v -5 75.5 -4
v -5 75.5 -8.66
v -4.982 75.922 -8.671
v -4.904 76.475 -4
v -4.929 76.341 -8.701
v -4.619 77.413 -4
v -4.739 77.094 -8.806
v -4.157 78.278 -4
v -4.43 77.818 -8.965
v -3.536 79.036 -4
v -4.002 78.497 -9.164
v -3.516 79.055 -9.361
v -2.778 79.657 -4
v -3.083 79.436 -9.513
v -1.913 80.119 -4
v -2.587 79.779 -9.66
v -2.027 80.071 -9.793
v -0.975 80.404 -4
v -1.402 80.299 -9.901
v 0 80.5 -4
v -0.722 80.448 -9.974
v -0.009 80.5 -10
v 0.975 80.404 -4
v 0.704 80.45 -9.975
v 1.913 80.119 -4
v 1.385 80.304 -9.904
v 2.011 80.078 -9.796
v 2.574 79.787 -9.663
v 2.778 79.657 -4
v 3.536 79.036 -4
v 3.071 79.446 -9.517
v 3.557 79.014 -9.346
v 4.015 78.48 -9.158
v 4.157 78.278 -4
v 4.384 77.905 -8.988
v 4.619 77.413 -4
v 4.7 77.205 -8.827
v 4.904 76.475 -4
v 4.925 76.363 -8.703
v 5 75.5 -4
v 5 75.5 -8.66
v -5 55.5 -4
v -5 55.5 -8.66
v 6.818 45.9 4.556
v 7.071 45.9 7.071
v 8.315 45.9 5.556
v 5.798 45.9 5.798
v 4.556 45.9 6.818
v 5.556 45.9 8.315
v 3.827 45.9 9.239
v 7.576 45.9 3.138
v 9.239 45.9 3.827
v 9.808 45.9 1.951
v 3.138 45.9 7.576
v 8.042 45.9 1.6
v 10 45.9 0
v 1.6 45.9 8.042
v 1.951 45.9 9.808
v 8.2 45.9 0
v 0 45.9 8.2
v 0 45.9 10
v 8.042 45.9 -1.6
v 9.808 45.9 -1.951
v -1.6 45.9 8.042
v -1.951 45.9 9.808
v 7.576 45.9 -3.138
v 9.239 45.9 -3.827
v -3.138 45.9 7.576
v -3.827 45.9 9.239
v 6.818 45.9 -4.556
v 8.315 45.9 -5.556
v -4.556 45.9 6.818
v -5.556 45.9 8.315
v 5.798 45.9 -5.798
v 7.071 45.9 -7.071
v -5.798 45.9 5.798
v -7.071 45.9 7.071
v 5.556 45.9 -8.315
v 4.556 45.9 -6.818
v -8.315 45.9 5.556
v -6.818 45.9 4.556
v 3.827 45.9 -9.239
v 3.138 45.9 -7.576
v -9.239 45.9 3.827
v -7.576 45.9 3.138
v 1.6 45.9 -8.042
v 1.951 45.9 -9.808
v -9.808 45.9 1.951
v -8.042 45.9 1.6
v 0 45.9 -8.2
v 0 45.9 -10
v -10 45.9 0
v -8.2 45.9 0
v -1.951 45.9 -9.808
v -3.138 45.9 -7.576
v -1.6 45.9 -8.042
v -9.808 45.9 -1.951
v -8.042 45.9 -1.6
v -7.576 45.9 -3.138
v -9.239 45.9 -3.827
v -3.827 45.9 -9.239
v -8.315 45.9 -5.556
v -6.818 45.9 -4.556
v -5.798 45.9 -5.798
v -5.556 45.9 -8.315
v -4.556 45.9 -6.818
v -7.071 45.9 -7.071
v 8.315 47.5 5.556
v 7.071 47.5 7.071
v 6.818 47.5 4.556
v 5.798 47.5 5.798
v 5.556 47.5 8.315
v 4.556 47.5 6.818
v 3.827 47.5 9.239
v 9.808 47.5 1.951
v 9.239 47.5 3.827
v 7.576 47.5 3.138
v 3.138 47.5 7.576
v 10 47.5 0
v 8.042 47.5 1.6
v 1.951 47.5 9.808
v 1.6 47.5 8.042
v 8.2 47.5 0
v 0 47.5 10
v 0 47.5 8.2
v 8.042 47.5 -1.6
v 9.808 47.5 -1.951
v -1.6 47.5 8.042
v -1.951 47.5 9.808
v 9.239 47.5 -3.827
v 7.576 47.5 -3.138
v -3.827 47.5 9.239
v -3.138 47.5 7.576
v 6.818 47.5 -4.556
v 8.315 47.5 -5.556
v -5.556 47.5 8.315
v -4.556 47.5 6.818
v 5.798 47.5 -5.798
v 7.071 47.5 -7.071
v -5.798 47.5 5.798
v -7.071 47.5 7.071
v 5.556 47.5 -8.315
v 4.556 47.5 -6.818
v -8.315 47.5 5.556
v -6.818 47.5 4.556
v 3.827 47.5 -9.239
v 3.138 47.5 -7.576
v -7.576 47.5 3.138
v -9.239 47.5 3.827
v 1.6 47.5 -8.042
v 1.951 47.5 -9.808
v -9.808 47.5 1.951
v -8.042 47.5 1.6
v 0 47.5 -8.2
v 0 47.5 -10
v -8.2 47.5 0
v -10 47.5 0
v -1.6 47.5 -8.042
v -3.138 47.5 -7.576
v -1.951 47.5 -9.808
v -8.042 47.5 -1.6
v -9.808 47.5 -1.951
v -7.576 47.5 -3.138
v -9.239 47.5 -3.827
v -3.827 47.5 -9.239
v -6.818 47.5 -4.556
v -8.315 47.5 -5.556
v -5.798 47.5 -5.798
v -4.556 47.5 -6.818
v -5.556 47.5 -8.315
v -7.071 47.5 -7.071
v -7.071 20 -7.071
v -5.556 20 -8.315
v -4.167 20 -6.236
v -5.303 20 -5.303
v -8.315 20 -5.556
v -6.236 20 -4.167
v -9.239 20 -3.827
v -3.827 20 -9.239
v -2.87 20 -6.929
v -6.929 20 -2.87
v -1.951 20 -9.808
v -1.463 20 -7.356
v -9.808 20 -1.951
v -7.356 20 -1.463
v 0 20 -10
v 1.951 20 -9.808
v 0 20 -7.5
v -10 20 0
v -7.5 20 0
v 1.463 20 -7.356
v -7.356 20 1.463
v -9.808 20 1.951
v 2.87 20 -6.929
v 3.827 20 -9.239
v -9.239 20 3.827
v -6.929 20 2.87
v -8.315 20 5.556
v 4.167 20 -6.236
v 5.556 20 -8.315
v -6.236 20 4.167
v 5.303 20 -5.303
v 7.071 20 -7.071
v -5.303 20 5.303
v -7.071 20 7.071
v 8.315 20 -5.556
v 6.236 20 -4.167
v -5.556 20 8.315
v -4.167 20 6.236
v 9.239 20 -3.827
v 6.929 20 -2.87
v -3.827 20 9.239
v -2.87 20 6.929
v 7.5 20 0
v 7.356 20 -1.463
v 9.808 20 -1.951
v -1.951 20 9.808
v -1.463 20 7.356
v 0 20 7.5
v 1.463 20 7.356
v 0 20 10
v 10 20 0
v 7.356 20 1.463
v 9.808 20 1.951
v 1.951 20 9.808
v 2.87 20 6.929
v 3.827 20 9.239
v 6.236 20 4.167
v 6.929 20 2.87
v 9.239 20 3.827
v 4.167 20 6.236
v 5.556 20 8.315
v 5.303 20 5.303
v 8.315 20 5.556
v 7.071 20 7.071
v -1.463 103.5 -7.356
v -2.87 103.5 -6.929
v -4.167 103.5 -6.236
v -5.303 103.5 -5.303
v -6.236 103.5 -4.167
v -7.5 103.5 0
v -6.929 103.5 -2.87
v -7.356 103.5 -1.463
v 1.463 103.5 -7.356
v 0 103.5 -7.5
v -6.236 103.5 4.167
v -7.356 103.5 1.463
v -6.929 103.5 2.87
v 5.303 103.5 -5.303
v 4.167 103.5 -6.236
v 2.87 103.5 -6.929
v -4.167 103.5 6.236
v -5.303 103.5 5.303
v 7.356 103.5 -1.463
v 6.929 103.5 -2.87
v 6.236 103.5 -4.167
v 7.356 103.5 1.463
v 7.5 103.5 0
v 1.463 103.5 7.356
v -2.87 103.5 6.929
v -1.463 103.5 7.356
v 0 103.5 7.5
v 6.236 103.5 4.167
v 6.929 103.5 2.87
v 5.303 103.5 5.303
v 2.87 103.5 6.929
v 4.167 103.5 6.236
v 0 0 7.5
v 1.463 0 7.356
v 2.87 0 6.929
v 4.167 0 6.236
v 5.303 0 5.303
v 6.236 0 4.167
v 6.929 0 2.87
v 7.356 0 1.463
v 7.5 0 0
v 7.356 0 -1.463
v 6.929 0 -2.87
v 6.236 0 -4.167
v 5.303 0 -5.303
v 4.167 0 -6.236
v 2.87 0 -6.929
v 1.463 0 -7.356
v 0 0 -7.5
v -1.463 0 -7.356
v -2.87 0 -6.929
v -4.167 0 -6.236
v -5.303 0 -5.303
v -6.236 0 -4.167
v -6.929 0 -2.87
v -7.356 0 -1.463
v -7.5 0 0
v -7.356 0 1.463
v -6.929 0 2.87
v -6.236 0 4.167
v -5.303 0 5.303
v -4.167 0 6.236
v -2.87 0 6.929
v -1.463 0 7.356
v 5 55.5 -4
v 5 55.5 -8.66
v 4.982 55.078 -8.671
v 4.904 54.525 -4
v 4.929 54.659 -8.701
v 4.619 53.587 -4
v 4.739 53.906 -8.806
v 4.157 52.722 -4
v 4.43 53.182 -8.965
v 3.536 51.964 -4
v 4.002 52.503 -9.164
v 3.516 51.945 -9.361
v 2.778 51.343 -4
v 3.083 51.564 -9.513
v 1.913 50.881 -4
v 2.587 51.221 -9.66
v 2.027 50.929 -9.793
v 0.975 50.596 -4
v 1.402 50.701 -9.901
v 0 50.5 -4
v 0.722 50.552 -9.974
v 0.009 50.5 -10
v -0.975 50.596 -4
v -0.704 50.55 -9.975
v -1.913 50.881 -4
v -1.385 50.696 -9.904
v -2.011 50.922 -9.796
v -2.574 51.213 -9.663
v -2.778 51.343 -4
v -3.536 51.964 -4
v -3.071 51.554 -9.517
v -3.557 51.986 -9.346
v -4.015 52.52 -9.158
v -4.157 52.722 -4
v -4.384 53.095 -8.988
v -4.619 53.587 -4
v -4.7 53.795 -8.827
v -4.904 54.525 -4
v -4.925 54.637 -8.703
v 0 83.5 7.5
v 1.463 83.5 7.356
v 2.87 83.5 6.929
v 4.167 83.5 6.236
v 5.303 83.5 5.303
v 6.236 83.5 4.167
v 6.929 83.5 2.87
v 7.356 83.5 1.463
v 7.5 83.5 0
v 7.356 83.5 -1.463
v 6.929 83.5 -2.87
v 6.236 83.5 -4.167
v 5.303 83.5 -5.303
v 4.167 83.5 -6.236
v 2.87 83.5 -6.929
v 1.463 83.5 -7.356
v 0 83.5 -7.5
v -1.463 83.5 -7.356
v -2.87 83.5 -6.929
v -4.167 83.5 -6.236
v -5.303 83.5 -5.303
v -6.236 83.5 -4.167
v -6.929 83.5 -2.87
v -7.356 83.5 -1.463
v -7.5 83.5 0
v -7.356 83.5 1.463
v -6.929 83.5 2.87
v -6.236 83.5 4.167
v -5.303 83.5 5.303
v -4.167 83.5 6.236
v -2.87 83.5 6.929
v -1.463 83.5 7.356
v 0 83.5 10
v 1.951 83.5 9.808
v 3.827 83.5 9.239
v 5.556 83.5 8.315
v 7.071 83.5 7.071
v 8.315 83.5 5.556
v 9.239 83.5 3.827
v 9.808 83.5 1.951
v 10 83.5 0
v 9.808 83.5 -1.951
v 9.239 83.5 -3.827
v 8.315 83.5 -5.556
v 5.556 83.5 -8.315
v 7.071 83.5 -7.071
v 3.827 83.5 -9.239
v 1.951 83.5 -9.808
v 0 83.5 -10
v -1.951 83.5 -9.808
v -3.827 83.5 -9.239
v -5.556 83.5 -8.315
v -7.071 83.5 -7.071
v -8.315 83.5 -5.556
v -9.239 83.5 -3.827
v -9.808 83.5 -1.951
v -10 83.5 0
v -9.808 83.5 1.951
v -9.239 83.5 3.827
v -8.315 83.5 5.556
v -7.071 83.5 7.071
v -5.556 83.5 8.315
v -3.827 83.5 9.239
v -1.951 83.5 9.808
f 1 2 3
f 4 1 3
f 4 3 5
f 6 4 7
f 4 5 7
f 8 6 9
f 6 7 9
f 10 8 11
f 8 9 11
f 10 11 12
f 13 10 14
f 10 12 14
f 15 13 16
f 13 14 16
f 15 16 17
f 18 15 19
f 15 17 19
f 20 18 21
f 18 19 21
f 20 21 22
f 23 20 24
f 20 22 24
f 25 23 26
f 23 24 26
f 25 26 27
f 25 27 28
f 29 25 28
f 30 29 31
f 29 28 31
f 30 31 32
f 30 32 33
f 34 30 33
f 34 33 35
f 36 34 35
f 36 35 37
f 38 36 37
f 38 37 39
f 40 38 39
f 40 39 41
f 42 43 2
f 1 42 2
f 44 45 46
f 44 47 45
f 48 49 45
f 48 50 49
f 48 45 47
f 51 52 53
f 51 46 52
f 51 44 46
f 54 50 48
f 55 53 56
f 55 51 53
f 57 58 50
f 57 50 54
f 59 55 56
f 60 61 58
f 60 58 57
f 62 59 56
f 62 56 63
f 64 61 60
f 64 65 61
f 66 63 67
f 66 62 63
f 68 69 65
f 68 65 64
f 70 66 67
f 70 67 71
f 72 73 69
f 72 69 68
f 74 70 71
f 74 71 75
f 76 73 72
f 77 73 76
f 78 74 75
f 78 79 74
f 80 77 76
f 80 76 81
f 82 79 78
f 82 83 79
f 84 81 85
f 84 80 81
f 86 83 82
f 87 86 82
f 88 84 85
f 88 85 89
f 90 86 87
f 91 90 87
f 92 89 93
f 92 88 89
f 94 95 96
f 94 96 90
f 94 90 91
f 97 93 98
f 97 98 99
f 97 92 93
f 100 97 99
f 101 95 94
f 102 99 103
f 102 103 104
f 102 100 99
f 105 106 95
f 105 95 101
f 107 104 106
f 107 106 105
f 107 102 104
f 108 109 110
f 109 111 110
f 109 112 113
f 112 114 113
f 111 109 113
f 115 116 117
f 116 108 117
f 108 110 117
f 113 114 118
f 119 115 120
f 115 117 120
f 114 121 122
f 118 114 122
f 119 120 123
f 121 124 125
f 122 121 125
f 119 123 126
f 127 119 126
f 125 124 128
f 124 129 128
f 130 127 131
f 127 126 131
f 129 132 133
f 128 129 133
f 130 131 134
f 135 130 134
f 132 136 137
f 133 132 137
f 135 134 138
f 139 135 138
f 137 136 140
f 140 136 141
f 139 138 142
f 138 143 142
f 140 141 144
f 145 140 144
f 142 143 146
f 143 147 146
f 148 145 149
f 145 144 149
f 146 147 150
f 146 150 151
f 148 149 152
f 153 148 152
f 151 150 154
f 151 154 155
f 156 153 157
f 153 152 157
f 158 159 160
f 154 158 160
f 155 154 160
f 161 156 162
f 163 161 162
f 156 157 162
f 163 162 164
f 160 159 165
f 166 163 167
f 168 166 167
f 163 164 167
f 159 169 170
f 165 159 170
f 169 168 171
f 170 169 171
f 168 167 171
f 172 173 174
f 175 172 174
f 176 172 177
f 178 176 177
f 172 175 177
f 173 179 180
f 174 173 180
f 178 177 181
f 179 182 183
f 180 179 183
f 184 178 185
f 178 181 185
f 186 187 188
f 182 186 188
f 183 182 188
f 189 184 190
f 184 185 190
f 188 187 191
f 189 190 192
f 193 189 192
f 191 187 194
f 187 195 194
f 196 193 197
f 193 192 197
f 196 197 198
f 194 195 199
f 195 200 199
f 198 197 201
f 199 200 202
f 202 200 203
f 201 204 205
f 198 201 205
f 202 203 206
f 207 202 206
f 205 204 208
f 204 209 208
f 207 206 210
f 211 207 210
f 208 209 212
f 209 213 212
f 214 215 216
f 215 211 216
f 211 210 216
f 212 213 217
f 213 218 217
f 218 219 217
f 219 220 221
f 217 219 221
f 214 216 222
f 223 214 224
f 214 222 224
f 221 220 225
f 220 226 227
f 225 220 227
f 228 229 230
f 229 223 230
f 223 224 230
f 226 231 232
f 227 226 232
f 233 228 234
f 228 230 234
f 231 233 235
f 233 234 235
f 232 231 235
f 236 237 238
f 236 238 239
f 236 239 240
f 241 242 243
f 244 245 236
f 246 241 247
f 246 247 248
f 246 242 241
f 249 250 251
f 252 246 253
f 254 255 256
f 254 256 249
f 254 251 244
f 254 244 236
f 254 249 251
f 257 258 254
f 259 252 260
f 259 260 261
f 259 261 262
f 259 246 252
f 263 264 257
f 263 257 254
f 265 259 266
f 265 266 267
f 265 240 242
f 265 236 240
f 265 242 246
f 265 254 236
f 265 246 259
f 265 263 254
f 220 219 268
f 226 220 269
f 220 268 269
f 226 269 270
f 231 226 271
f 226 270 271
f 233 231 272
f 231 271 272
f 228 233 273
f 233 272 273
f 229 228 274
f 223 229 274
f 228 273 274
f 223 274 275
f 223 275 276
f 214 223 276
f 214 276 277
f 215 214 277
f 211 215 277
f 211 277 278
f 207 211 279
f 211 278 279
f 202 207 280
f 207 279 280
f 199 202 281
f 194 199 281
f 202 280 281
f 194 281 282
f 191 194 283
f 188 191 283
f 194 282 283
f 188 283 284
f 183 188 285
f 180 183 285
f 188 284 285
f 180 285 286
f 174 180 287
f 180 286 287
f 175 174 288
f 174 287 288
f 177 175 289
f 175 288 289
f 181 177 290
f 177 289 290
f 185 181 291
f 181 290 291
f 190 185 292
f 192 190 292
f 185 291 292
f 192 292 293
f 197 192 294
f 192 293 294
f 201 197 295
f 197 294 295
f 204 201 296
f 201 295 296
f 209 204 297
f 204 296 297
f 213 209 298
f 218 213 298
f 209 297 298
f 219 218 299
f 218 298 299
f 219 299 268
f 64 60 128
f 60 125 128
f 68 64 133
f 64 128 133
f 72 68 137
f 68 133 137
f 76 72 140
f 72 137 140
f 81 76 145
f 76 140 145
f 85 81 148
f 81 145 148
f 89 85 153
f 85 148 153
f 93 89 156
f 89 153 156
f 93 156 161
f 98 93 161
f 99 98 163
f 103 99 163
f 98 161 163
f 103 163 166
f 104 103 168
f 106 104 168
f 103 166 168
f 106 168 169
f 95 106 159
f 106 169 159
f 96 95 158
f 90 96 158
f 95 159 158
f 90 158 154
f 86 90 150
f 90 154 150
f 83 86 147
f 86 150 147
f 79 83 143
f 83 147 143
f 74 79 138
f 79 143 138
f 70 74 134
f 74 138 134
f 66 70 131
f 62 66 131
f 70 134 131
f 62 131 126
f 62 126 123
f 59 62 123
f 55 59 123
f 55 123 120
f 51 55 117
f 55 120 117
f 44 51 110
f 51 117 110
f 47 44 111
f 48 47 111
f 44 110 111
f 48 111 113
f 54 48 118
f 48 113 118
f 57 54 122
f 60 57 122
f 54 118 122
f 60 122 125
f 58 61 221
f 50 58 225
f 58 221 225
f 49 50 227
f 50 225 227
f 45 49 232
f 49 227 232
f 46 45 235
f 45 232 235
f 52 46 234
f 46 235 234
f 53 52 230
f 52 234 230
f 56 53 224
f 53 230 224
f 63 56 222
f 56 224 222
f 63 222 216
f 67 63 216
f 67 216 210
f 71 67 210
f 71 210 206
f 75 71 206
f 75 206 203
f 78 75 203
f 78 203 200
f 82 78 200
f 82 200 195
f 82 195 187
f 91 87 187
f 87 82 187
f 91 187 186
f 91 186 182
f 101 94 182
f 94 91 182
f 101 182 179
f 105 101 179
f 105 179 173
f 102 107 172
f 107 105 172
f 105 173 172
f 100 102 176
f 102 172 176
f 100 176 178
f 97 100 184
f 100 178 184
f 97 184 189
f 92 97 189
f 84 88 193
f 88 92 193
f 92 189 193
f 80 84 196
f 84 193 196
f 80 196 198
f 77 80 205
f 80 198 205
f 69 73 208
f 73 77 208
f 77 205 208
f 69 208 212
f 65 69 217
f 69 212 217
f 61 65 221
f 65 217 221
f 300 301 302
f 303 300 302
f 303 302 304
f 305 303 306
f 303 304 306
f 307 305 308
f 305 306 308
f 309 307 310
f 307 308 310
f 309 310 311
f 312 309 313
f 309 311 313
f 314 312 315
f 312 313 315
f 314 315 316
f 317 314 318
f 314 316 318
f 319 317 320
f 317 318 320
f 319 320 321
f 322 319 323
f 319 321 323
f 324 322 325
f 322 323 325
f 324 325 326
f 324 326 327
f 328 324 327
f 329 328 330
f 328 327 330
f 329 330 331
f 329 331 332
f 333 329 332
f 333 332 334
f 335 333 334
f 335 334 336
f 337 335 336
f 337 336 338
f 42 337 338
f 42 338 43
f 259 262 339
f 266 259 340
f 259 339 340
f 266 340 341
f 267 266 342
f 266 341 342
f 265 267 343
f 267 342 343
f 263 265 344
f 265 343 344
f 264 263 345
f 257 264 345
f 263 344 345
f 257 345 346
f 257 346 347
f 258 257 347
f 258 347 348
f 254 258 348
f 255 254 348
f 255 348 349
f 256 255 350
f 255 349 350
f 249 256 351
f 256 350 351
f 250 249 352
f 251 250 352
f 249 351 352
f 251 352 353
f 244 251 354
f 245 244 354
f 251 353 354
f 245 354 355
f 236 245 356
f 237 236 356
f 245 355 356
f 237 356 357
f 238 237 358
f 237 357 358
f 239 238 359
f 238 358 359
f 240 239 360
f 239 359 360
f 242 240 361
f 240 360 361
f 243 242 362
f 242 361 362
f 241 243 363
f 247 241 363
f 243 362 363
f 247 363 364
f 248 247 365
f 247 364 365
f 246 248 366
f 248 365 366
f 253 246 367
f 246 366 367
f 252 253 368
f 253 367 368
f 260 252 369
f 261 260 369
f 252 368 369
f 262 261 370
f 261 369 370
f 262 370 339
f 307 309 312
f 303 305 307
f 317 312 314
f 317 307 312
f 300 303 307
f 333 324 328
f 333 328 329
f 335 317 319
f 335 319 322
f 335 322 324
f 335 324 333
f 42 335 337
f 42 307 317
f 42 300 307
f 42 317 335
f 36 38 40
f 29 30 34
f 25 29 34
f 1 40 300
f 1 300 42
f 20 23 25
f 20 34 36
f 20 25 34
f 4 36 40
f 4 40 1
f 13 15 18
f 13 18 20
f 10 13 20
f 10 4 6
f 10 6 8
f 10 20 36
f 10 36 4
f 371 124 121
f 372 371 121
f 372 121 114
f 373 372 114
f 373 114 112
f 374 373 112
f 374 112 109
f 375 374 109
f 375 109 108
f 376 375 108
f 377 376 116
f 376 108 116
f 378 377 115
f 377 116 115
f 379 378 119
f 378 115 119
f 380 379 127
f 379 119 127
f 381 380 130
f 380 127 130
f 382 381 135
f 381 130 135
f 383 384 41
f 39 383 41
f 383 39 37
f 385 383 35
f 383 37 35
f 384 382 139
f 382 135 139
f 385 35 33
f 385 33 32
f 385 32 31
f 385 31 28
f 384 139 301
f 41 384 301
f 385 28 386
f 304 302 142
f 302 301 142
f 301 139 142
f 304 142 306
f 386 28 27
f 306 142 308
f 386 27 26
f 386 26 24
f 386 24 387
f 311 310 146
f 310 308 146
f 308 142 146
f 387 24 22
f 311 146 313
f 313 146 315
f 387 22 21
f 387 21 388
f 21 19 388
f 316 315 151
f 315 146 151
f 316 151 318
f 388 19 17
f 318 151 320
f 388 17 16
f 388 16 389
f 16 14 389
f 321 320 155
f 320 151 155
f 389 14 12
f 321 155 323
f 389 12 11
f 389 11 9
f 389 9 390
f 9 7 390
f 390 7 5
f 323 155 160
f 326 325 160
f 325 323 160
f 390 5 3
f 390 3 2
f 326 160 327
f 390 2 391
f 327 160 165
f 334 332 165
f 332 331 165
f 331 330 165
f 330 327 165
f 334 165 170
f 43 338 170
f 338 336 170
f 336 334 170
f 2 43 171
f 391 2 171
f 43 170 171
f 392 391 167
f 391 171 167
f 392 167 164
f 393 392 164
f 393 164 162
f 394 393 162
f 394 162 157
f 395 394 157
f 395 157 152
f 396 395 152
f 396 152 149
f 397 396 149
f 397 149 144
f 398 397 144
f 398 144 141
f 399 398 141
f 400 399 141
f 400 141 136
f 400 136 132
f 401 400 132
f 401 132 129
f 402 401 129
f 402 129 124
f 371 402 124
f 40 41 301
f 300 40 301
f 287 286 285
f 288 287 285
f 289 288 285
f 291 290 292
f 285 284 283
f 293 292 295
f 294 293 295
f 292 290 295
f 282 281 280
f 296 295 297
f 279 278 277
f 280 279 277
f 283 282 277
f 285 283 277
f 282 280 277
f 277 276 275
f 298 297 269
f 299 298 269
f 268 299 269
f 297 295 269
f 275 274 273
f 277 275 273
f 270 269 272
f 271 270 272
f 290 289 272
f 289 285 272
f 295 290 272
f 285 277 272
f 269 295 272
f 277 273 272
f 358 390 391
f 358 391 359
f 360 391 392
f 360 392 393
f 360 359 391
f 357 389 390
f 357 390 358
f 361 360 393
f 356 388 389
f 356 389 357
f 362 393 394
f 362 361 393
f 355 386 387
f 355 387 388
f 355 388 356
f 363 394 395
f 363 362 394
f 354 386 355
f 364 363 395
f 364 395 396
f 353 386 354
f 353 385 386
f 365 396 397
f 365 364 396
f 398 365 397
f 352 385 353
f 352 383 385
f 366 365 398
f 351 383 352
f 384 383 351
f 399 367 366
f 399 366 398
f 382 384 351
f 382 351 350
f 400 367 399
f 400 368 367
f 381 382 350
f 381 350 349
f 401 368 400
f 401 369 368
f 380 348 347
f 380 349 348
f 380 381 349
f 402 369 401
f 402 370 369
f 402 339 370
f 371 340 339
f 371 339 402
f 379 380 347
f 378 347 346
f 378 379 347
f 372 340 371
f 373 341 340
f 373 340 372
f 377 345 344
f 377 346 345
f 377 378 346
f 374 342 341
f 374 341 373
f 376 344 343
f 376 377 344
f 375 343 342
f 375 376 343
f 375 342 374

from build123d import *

# Parameters (mm, degrees)
SKETCH1_R           = 7.5
BOSS_EXTRUDE1_DEPTH = 20
SKETCH2_R           = 10
BOSS_EXTRUDE2_DEPTH = 63.5
SKETCH3_R           = 7.5
BOSS_EXTRUDE3_DEPTH = 20
CUT_EXTRUDE1_DEPTH  = 6
SKETCH5_W           = 1.8
SKETCH5_H           = 1.6


with BuildPart() as part:
    # Sketch1 → Boss-Extrude1 (new body)
    with BuildSketch(Plane(origin=(0, 0, 0), x_dir=(1, 0, 0), z_dir=(0, 1, 0))):
        with Locations(Location((0, 0, 0), (0, 0, 270))):
            Circle(SKETCH1_R)
    extrude(amount=BOSS_EXTRUDE1_DEPTH)

    # Sketch2 → Boss-Extrude2 (add)
    with BuildSketch(Plane(origin=(0, 20, 0), x_dir=(1, 0, 0), z_dir=(0, 1, 0))):
        with Locations(Location((0, 0, 0), (0, 0, 270))):
            Circle(SKETCH2_R)
    extrude(amount=BOSS_EXTRUDE2_DEPTH)

    # Sketch3 → Boss-Extrude3 (add)
    with BuildSketch(Plane(origin=(0, 83.5, 0), x_dir=(1, 0, 0), z_dir=(0, 1, 0))):
        with Locations(Location((0, 0, 0), (0, 0, 270))):
            Circle(SKETCH3_R)
    extrude(amount=BOSS_EXTRUDE3_DEPTH)

    # Sketch4 → Cut-Extrude1 (cut)
    with BuildSketch(Plane(origin=(0, 0, -10), x_dir=(-1, 0, 0), z_dir=(0, 0, -1))):
        with BuildLine():
            Line((-5, 75.5), (-5, 55.5))
            ThreePointArc((-5, 55.5), (0, 50.5), (5, 55.5))
            Line((5, 55.5), (5, 75.5))
            ThreePointArc((5, 75.5), (0, 80.5), (-5, 75.5))
        make_face()
    extrude(amount=-CUT_EXTRUDE1_DEPTH, mode=Mode.SUBTRACT)

    # Sketch5 → Cut-Revolve1 (revolve, cut)
    with BuildSketch(Plane(origin=(0, 0, 0), x_dir=(0, 0, -1), z_dir=(1, 0, 0)), mode=Mode.PRIVATE) as cut_revolve1_sk:
        with Locations((9.1, 46.7)):
            Rectangle(SKETCH5_W, SKETCH5_H)
    revolve(cut_revolve1_sk.sketch.rotate(Axis((0, 103.034047477, 0), (0, -1, 0)), 180), axis=Axis((0, 103.034047477, 0), (0, -1, 0)), mode=Mode.SUBTRACT)


solid = part.part
